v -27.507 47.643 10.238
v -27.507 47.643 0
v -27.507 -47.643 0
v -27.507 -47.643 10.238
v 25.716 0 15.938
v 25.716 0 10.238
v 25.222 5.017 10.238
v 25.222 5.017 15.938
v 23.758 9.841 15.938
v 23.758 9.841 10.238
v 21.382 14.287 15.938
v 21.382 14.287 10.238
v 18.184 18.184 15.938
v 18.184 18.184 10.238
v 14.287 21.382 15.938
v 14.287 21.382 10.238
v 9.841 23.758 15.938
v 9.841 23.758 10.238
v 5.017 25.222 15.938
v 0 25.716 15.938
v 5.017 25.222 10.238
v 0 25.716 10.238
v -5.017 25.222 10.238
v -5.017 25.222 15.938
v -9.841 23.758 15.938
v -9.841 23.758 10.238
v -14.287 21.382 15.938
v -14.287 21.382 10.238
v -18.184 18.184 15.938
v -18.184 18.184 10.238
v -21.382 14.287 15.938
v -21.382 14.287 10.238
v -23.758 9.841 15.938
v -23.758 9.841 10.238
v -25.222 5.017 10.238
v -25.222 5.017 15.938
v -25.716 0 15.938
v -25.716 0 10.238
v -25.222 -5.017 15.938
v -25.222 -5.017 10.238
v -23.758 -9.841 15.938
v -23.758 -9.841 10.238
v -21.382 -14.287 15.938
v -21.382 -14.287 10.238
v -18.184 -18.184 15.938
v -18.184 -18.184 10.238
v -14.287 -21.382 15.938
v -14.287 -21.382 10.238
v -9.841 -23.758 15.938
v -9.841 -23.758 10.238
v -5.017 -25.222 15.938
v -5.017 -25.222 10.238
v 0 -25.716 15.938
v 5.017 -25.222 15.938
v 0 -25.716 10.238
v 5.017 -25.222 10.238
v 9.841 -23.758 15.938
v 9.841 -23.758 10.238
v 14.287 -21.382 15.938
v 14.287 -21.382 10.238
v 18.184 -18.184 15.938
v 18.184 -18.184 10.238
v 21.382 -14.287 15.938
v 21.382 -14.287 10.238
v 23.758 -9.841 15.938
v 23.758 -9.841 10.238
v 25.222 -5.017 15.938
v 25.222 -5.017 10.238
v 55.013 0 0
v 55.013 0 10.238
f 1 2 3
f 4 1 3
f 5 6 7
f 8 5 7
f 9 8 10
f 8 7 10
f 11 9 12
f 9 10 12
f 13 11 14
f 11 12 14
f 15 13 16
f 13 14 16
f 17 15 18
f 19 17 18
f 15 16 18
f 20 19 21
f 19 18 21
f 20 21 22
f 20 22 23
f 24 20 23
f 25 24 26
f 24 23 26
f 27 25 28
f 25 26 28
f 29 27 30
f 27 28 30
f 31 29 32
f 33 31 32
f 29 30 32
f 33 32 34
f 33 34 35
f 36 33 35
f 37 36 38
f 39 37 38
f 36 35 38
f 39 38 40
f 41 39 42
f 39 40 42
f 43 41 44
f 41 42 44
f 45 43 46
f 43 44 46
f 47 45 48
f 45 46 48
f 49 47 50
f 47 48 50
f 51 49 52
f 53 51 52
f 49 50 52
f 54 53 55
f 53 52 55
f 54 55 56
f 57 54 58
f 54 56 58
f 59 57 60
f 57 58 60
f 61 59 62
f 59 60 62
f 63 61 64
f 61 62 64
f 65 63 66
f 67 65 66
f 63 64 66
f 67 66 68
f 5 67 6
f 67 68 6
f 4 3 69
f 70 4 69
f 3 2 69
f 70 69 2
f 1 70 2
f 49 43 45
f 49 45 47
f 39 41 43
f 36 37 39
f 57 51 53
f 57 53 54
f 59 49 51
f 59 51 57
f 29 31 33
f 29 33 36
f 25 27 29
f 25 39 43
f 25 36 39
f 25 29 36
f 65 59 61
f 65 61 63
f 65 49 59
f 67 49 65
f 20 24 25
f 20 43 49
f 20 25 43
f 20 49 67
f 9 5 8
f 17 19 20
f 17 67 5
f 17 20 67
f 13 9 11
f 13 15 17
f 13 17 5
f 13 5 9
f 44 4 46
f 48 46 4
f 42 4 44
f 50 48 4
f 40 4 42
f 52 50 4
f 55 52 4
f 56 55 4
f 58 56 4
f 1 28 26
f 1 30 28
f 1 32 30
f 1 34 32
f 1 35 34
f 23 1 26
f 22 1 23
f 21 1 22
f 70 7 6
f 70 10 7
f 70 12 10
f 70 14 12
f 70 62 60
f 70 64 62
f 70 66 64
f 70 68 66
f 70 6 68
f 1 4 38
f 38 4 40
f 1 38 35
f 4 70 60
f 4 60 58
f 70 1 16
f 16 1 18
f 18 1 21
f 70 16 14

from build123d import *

# Parameters (mm, degrees)
F1_DEPTH = 10.23828
F2_R     = 25.715841
F3_DEPTH = 5.69966


with BuildPart() as f1:
    # F0 (on Top) → F1 (new body)
    with BuildSketch(Plane.XY):
        Polygon((-27.506582, 47.642798), (-27.506582, -47.642798), (55.013165, 0), align=None)
    extrude(amount=F1_DEPTH)

    # F2 (on face) → F3 (join)
    with BuildSketch(Plane.XY.offset(10.23828)):
        Circle(F2_R)
    extrude(amount=F3_DEPTH)


solid = f1.part
